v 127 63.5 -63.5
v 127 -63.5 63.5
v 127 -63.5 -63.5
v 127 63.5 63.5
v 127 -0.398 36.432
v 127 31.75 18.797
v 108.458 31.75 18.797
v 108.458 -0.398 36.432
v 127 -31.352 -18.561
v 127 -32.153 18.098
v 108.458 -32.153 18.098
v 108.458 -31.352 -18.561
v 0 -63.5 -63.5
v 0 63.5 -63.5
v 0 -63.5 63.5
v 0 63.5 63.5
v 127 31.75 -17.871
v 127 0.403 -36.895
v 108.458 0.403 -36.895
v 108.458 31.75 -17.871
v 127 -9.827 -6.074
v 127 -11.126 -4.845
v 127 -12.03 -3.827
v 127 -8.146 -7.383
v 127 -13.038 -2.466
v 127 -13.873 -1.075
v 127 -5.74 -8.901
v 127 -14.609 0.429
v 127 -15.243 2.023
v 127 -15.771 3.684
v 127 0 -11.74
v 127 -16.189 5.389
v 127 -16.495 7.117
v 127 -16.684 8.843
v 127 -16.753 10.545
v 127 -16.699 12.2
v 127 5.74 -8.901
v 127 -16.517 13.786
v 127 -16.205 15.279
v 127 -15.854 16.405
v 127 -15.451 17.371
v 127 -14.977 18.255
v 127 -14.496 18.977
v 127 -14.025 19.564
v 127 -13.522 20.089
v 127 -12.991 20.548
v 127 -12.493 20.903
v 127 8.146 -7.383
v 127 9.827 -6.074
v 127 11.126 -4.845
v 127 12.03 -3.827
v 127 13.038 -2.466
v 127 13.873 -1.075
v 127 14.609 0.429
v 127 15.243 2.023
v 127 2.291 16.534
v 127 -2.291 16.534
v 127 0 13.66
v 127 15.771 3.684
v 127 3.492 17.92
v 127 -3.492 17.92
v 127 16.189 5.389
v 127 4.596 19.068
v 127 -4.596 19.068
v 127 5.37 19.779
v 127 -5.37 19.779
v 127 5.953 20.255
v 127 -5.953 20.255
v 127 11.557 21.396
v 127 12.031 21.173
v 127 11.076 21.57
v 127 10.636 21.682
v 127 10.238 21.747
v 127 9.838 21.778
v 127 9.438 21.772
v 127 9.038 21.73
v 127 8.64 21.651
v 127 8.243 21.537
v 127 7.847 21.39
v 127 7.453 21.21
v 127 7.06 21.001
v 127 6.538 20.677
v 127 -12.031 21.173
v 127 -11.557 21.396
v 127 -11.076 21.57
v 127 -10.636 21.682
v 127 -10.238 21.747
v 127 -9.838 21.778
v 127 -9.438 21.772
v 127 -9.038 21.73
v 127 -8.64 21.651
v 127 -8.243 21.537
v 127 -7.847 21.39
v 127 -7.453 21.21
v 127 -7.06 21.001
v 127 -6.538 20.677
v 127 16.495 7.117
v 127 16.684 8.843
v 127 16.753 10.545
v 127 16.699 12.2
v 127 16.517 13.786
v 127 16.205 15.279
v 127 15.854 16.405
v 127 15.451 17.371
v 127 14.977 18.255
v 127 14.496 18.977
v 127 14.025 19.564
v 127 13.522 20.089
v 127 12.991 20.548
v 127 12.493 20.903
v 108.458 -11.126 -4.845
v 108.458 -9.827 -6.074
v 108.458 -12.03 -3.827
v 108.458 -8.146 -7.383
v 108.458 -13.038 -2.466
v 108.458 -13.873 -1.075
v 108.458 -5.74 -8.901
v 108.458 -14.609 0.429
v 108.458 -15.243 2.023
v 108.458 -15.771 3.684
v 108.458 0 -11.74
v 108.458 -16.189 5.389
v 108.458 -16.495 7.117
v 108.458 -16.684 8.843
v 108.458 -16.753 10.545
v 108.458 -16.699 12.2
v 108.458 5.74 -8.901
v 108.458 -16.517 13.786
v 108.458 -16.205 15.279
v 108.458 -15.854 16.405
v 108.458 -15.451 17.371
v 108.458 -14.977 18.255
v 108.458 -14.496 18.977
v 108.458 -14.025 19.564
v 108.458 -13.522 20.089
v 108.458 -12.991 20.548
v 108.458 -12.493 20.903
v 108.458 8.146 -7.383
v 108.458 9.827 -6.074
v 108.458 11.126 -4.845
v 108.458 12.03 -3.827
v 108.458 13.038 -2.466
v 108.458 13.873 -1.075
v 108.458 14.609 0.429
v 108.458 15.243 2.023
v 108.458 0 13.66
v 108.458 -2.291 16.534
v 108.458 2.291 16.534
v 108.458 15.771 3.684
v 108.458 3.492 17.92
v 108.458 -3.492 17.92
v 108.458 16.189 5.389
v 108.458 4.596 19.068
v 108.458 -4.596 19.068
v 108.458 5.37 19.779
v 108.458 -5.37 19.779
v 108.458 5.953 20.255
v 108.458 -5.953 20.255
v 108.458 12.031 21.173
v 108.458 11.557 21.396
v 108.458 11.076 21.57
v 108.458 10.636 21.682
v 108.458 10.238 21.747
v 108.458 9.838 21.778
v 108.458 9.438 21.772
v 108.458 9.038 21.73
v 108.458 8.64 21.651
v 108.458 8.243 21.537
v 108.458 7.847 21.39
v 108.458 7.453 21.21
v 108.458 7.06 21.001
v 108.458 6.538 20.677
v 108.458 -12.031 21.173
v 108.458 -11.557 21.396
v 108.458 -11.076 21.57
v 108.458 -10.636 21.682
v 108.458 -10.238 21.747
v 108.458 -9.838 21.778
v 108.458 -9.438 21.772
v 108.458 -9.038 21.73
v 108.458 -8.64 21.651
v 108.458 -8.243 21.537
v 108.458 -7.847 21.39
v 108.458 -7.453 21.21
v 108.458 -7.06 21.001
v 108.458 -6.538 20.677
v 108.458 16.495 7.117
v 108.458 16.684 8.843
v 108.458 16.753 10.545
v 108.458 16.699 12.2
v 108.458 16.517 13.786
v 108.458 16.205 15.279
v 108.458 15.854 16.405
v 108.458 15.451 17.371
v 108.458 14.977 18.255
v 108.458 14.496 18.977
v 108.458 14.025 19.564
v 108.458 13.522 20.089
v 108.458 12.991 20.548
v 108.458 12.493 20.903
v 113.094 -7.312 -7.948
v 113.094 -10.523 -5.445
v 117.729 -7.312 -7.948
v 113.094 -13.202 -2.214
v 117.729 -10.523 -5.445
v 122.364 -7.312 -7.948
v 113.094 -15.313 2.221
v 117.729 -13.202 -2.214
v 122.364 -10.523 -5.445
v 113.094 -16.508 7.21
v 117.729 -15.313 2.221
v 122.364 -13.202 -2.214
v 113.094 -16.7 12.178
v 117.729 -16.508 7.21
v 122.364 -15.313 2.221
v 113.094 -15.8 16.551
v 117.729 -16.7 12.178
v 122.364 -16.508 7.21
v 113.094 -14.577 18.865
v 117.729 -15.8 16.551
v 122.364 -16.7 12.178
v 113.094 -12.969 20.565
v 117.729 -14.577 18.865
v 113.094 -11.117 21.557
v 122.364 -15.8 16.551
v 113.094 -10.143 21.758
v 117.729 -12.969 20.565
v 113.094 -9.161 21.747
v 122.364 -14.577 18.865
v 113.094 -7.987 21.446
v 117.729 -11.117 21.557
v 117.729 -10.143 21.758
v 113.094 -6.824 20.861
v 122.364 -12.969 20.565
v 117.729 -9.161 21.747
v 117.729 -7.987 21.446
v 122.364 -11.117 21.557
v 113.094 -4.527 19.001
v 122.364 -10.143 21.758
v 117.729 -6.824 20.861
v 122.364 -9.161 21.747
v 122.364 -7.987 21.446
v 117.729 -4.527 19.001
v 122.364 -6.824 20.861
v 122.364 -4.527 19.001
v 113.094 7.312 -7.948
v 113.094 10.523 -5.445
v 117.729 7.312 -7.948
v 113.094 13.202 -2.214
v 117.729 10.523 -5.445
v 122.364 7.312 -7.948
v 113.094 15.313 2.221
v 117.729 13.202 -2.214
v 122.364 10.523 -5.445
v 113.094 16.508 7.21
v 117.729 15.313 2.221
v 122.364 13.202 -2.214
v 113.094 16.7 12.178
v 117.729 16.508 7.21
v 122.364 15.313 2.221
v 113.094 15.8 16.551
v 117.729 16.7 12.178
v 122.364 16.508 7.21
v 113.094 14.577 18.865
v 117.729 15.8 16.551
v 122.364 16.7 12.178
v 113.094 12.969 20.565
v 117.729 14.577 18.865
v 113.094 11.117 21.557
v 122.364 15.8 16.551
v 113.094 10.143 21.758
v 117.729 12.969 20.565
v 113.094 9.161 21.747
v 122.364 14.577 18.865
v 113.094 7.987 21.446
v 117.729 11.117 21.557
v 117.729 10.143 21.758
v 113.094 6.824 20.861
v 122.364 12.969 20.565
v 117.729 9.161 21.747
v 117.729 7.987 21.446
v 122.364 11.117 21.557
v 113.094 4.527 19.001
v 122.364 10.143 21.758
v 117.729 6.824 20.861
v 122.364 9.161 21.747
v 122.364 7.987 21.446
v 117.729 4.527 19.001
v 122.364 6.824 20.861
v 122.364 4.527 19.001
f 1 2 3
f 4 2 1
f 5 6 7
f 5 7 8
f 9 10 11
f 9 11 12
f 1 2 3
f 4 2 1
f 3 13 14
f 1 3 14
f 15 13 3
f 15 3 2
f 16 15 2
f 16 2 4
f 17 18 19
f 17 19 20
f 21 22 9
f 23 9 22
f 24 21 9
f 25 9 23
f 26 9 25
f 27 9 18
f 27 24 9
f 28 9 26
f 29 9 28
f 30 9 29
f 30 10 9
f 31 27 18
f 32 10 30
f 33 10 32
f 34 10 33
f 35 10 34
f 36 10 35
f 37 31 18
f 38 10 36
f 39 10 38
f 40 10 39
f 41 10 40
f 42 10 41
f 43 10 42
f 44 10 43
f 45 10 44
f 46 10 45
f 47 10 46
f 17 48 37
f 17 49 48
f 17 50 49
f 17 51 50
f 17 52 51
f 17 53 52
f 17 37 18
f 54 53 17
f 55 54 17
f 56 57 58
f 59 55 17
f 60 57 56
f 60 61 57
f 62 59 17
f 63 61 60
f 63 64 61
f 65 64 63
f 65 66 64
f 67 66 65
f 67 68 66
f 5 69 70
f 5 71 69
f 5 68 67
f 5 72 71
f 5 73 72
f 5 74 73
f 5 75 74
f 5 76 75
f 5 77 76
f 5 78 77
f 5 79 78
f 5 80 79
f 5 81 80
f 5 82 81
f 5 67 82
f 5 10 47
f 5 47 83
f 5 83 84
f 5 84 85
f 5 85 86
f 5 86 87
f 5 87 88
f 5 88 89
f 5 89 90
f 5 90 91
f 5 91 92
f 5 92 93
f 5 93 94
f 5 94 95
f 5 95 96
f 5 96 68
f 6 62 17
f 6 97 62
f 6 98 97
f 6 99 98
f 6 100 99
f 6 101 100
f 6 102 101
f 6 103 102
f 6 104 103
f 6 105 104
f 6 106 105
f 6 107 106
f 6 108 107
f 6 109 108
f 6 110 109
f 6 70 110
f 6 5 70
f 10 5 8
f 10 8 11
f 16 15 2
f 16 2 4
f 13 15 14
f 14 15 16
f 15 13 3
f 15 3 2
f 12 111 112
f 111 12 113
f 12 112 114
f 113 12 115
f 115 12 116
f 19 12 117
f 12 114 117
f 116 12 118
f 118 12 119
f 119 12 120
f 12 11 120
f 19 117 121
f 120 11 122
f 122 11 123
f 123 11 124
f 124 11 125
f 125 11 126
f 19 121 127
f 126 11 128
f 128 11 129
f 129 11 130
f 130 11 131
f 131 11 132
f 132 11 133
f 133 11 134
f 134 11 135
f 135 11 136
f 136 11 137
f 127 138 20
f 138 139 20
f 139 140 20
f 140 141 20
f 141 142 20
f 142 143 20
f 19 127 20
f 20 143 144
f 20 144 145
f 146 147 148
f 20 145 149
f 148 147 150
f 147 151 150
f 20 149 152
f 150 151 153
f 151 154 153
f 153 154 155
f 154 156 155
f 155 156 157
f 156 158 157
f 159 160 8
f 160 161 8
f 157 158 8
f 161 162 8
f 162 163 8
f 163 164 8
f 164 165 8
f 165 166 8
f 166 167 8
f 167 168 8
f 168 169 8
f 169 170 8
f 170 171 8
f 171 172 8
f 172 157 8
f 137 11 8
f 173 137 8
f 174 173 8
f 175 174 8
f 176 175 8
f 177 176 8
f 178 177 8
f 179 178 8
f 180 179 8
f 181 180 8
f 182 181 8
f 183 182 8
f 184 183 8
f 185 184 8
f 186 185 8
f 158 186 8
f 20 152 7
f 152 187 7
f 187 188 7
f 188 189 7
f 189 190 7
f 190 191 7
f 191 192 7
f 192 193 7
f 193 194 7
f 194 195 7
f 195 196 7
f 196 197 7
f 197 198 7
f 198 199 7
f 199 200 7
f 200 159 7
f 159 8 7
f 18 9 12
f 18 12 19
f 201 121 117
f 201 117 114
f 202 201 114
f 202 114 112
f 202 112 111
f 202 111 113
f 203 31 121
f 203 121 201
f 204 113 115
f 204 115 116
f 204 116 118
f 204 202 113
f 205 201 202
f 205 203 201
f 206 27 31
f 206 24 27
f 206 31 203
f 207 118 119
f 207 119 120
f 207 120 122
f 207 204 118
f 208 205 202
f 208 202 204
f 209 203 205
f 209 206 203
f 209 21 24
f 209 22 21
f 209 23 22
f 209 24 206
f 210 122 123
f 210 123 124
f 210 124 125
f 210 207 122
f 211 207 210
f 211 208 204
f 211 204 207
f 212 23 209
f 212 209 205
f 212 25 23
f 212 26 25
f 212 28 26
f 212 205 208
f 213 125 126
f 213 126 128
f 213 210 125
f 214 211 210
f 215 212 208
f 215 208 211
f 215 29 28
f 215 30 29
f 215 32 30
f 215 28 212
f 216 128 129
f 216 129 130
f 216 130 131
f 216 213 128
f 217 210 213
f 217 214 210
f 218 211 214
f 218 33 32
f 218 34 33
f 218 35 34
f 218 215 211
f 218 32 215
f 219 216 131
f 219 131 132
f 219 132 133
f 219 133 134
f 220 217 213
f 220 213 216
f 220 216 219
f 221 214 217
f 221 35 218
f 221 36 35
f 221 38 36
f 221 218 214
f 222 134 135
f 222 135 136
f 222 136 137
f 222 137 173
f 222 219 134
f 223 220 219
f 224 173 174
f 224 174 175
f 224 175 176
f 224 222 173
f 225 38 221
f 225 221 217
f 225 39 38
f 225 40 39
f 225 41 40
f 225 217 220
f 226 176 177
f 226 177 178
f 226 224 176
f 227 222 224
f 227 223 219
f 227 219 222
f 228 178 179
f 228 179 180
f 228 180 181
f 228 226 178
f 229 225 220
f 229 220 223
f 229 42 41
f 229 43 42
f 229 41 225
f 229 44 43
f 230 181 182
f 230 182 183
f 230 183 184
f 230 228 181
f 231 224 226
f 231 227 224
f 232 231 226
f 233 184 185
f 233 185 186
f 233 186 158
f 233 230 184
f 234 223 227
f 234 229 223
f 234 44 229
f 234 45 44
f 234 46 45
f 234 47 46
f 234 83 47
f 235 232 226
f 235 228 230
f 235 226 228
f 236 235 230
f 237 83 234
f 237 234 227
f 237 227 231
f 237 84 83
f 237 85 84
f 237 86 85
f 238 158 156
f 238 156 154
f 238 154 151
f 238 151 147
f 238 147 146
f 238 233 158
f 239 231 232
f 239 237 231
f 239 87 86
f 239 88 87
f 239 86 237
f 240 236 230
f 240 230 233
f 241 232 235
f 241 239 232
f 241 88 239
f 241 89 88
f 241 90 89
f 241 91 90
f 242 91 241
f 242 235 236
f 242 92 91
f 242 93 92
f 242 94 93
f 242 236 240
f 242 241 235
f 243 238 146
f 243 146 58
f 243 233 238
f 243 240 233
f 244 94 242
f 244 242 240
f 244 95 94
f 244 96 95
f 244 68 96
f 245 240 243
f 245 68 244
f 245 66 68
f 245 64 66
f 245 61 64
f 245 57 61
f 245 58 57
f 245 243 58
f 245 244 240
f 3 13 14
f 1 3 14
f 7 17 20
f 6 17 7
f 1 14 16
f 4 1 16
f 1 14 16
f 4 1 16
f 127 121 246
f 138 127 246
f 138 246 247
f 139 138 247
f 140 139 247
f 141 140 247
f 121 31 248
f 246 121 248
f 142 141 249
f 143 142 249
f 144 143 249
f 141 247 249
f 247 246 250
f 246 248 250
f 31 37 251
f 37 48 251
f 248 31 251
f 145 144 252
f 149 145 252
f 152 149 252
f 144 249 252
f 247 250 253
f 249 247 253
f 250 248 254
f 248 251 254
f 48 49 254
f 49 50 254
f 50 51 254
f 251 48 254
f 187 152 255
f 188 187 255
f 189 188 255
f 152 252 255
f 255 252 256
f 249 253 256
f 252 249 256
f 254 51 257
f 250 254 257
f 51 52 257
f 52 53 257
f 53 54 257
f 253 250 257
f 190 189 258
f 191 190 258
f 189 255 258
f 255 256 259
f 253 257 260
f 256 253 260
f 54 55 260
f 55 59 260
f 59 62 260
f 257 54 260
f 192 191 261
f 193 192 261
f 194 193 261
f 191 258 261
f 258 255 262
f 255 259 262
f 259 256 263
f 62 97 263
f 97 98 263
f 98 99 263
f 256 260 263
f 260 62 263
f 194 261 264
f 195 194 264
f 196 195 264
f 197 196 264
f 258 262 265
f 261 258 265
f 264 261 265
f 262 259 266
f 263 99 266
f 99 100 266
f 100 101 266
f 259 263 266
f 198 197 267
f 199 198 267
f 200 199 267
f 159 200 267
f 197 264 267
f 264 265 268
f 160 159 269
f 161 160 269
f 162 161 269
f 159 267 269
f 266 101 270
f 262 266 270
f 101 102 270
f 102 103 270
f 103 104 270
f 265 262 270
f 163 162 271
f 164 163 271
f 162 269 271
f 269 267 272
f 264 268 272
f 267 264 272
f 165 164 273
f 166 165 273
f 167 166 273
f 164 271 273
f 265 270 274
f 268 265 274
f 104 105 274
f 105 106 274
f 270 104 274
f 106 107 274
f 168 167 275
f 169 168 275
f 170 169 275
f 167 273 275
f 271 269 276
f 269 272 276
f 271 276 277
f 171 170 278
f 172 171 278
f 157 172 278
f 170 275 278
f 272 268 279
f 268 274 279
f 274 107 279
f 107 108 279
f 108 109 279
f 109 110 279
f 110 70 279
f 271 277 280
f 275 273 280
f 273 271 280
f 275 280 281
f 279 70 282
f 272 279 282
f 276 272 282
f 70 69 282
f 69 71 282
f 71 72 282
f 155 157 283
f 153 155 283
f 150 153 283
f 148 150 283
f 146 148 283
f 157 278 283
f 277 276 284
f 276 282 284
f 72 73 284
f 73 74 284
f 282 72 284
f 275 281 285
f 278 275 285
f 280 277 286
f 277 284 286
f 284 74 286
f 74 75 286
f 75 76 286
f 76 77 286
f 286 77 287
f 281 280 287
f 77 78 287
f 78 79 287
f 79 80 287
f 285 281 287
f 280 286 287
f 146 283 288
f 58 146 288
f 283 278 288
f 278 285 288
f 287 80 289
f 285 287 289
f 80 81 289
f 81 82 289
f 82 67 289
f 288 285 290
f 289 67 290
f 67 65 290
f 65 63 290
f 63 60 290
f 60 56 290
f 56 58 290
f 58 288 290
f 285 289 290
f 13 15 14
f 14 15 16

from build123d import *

# Parameters (mm, degrees)
F0_W     = 127
F0_H     = 127
F1_DEPTH = 127
F2_DEPTH = 127
F5_DEPTH = 18.542


with BuildPart() as f1:
    # F0 (on Right) → F1 (new body)
    with BuildSketch(Plane.YZ):
        Rectangle(F0_W, F0_H)
    extrude(amount=F1_DEPTH)


with BuildPart() as f2:
    # F0 (on Right) → F2 (new body)
    with BuildSketch(Plane.YZ):
        Rectangle(F0_W, F0_H)
    extrude(amount=F2_DEPTH)


with BuildPart() as f5:
    # F3 (on face) → F5 (new body)
    with BuildSketch(Plane.YZ.offset(127)):
        Polygon((31.75, -17.8710395744), (31.75, 18.7965432325), (-0.3982257365, 36.4318263574), (-32.1532839427, 18.0980349539), (-31.3517742635, -18.5607867829), (0.4032839427, -36.8945781864), align=None)
        with BuildLine():
            add(Edge.make_bspline(
                [(0, -11.739959009), (5.0322962281, -9.4274706057), (15.4928277067, -4.620548151), (18.5544414166, 16.9097815547), (8.5100486097, 24.5553381098), (3.0063934578, 17.5090848074), (0, 13.660040991)],
                knots=[0, 0, 0, 0, 0.2728764595, 0.567222728, 0.7635936985, 1, 1, 1, 1], degree=3))
            add(Edge.make_bspline(
                [(0, -11.739959009), (-5.0322962281, -9.4274706057), (-15.4928277067, -4.620548151), (-18.5544414166, 16.9097815547), (-8.5100486097, 24.5553381098), (-3.0063934578, 17.5090848074), (0, 13.660040991)],
                knots=[0, 0, 0, 0, 0.2728764595, 0.567222728, 0.7635936985, 1, 1, 1, 1], degree=3))
        make_face(mode=Mode.SUBTRACT)
    extrude(amount=-F5_DEPTH)


solid = Compound([f1.part, f2.part, f5.part])
